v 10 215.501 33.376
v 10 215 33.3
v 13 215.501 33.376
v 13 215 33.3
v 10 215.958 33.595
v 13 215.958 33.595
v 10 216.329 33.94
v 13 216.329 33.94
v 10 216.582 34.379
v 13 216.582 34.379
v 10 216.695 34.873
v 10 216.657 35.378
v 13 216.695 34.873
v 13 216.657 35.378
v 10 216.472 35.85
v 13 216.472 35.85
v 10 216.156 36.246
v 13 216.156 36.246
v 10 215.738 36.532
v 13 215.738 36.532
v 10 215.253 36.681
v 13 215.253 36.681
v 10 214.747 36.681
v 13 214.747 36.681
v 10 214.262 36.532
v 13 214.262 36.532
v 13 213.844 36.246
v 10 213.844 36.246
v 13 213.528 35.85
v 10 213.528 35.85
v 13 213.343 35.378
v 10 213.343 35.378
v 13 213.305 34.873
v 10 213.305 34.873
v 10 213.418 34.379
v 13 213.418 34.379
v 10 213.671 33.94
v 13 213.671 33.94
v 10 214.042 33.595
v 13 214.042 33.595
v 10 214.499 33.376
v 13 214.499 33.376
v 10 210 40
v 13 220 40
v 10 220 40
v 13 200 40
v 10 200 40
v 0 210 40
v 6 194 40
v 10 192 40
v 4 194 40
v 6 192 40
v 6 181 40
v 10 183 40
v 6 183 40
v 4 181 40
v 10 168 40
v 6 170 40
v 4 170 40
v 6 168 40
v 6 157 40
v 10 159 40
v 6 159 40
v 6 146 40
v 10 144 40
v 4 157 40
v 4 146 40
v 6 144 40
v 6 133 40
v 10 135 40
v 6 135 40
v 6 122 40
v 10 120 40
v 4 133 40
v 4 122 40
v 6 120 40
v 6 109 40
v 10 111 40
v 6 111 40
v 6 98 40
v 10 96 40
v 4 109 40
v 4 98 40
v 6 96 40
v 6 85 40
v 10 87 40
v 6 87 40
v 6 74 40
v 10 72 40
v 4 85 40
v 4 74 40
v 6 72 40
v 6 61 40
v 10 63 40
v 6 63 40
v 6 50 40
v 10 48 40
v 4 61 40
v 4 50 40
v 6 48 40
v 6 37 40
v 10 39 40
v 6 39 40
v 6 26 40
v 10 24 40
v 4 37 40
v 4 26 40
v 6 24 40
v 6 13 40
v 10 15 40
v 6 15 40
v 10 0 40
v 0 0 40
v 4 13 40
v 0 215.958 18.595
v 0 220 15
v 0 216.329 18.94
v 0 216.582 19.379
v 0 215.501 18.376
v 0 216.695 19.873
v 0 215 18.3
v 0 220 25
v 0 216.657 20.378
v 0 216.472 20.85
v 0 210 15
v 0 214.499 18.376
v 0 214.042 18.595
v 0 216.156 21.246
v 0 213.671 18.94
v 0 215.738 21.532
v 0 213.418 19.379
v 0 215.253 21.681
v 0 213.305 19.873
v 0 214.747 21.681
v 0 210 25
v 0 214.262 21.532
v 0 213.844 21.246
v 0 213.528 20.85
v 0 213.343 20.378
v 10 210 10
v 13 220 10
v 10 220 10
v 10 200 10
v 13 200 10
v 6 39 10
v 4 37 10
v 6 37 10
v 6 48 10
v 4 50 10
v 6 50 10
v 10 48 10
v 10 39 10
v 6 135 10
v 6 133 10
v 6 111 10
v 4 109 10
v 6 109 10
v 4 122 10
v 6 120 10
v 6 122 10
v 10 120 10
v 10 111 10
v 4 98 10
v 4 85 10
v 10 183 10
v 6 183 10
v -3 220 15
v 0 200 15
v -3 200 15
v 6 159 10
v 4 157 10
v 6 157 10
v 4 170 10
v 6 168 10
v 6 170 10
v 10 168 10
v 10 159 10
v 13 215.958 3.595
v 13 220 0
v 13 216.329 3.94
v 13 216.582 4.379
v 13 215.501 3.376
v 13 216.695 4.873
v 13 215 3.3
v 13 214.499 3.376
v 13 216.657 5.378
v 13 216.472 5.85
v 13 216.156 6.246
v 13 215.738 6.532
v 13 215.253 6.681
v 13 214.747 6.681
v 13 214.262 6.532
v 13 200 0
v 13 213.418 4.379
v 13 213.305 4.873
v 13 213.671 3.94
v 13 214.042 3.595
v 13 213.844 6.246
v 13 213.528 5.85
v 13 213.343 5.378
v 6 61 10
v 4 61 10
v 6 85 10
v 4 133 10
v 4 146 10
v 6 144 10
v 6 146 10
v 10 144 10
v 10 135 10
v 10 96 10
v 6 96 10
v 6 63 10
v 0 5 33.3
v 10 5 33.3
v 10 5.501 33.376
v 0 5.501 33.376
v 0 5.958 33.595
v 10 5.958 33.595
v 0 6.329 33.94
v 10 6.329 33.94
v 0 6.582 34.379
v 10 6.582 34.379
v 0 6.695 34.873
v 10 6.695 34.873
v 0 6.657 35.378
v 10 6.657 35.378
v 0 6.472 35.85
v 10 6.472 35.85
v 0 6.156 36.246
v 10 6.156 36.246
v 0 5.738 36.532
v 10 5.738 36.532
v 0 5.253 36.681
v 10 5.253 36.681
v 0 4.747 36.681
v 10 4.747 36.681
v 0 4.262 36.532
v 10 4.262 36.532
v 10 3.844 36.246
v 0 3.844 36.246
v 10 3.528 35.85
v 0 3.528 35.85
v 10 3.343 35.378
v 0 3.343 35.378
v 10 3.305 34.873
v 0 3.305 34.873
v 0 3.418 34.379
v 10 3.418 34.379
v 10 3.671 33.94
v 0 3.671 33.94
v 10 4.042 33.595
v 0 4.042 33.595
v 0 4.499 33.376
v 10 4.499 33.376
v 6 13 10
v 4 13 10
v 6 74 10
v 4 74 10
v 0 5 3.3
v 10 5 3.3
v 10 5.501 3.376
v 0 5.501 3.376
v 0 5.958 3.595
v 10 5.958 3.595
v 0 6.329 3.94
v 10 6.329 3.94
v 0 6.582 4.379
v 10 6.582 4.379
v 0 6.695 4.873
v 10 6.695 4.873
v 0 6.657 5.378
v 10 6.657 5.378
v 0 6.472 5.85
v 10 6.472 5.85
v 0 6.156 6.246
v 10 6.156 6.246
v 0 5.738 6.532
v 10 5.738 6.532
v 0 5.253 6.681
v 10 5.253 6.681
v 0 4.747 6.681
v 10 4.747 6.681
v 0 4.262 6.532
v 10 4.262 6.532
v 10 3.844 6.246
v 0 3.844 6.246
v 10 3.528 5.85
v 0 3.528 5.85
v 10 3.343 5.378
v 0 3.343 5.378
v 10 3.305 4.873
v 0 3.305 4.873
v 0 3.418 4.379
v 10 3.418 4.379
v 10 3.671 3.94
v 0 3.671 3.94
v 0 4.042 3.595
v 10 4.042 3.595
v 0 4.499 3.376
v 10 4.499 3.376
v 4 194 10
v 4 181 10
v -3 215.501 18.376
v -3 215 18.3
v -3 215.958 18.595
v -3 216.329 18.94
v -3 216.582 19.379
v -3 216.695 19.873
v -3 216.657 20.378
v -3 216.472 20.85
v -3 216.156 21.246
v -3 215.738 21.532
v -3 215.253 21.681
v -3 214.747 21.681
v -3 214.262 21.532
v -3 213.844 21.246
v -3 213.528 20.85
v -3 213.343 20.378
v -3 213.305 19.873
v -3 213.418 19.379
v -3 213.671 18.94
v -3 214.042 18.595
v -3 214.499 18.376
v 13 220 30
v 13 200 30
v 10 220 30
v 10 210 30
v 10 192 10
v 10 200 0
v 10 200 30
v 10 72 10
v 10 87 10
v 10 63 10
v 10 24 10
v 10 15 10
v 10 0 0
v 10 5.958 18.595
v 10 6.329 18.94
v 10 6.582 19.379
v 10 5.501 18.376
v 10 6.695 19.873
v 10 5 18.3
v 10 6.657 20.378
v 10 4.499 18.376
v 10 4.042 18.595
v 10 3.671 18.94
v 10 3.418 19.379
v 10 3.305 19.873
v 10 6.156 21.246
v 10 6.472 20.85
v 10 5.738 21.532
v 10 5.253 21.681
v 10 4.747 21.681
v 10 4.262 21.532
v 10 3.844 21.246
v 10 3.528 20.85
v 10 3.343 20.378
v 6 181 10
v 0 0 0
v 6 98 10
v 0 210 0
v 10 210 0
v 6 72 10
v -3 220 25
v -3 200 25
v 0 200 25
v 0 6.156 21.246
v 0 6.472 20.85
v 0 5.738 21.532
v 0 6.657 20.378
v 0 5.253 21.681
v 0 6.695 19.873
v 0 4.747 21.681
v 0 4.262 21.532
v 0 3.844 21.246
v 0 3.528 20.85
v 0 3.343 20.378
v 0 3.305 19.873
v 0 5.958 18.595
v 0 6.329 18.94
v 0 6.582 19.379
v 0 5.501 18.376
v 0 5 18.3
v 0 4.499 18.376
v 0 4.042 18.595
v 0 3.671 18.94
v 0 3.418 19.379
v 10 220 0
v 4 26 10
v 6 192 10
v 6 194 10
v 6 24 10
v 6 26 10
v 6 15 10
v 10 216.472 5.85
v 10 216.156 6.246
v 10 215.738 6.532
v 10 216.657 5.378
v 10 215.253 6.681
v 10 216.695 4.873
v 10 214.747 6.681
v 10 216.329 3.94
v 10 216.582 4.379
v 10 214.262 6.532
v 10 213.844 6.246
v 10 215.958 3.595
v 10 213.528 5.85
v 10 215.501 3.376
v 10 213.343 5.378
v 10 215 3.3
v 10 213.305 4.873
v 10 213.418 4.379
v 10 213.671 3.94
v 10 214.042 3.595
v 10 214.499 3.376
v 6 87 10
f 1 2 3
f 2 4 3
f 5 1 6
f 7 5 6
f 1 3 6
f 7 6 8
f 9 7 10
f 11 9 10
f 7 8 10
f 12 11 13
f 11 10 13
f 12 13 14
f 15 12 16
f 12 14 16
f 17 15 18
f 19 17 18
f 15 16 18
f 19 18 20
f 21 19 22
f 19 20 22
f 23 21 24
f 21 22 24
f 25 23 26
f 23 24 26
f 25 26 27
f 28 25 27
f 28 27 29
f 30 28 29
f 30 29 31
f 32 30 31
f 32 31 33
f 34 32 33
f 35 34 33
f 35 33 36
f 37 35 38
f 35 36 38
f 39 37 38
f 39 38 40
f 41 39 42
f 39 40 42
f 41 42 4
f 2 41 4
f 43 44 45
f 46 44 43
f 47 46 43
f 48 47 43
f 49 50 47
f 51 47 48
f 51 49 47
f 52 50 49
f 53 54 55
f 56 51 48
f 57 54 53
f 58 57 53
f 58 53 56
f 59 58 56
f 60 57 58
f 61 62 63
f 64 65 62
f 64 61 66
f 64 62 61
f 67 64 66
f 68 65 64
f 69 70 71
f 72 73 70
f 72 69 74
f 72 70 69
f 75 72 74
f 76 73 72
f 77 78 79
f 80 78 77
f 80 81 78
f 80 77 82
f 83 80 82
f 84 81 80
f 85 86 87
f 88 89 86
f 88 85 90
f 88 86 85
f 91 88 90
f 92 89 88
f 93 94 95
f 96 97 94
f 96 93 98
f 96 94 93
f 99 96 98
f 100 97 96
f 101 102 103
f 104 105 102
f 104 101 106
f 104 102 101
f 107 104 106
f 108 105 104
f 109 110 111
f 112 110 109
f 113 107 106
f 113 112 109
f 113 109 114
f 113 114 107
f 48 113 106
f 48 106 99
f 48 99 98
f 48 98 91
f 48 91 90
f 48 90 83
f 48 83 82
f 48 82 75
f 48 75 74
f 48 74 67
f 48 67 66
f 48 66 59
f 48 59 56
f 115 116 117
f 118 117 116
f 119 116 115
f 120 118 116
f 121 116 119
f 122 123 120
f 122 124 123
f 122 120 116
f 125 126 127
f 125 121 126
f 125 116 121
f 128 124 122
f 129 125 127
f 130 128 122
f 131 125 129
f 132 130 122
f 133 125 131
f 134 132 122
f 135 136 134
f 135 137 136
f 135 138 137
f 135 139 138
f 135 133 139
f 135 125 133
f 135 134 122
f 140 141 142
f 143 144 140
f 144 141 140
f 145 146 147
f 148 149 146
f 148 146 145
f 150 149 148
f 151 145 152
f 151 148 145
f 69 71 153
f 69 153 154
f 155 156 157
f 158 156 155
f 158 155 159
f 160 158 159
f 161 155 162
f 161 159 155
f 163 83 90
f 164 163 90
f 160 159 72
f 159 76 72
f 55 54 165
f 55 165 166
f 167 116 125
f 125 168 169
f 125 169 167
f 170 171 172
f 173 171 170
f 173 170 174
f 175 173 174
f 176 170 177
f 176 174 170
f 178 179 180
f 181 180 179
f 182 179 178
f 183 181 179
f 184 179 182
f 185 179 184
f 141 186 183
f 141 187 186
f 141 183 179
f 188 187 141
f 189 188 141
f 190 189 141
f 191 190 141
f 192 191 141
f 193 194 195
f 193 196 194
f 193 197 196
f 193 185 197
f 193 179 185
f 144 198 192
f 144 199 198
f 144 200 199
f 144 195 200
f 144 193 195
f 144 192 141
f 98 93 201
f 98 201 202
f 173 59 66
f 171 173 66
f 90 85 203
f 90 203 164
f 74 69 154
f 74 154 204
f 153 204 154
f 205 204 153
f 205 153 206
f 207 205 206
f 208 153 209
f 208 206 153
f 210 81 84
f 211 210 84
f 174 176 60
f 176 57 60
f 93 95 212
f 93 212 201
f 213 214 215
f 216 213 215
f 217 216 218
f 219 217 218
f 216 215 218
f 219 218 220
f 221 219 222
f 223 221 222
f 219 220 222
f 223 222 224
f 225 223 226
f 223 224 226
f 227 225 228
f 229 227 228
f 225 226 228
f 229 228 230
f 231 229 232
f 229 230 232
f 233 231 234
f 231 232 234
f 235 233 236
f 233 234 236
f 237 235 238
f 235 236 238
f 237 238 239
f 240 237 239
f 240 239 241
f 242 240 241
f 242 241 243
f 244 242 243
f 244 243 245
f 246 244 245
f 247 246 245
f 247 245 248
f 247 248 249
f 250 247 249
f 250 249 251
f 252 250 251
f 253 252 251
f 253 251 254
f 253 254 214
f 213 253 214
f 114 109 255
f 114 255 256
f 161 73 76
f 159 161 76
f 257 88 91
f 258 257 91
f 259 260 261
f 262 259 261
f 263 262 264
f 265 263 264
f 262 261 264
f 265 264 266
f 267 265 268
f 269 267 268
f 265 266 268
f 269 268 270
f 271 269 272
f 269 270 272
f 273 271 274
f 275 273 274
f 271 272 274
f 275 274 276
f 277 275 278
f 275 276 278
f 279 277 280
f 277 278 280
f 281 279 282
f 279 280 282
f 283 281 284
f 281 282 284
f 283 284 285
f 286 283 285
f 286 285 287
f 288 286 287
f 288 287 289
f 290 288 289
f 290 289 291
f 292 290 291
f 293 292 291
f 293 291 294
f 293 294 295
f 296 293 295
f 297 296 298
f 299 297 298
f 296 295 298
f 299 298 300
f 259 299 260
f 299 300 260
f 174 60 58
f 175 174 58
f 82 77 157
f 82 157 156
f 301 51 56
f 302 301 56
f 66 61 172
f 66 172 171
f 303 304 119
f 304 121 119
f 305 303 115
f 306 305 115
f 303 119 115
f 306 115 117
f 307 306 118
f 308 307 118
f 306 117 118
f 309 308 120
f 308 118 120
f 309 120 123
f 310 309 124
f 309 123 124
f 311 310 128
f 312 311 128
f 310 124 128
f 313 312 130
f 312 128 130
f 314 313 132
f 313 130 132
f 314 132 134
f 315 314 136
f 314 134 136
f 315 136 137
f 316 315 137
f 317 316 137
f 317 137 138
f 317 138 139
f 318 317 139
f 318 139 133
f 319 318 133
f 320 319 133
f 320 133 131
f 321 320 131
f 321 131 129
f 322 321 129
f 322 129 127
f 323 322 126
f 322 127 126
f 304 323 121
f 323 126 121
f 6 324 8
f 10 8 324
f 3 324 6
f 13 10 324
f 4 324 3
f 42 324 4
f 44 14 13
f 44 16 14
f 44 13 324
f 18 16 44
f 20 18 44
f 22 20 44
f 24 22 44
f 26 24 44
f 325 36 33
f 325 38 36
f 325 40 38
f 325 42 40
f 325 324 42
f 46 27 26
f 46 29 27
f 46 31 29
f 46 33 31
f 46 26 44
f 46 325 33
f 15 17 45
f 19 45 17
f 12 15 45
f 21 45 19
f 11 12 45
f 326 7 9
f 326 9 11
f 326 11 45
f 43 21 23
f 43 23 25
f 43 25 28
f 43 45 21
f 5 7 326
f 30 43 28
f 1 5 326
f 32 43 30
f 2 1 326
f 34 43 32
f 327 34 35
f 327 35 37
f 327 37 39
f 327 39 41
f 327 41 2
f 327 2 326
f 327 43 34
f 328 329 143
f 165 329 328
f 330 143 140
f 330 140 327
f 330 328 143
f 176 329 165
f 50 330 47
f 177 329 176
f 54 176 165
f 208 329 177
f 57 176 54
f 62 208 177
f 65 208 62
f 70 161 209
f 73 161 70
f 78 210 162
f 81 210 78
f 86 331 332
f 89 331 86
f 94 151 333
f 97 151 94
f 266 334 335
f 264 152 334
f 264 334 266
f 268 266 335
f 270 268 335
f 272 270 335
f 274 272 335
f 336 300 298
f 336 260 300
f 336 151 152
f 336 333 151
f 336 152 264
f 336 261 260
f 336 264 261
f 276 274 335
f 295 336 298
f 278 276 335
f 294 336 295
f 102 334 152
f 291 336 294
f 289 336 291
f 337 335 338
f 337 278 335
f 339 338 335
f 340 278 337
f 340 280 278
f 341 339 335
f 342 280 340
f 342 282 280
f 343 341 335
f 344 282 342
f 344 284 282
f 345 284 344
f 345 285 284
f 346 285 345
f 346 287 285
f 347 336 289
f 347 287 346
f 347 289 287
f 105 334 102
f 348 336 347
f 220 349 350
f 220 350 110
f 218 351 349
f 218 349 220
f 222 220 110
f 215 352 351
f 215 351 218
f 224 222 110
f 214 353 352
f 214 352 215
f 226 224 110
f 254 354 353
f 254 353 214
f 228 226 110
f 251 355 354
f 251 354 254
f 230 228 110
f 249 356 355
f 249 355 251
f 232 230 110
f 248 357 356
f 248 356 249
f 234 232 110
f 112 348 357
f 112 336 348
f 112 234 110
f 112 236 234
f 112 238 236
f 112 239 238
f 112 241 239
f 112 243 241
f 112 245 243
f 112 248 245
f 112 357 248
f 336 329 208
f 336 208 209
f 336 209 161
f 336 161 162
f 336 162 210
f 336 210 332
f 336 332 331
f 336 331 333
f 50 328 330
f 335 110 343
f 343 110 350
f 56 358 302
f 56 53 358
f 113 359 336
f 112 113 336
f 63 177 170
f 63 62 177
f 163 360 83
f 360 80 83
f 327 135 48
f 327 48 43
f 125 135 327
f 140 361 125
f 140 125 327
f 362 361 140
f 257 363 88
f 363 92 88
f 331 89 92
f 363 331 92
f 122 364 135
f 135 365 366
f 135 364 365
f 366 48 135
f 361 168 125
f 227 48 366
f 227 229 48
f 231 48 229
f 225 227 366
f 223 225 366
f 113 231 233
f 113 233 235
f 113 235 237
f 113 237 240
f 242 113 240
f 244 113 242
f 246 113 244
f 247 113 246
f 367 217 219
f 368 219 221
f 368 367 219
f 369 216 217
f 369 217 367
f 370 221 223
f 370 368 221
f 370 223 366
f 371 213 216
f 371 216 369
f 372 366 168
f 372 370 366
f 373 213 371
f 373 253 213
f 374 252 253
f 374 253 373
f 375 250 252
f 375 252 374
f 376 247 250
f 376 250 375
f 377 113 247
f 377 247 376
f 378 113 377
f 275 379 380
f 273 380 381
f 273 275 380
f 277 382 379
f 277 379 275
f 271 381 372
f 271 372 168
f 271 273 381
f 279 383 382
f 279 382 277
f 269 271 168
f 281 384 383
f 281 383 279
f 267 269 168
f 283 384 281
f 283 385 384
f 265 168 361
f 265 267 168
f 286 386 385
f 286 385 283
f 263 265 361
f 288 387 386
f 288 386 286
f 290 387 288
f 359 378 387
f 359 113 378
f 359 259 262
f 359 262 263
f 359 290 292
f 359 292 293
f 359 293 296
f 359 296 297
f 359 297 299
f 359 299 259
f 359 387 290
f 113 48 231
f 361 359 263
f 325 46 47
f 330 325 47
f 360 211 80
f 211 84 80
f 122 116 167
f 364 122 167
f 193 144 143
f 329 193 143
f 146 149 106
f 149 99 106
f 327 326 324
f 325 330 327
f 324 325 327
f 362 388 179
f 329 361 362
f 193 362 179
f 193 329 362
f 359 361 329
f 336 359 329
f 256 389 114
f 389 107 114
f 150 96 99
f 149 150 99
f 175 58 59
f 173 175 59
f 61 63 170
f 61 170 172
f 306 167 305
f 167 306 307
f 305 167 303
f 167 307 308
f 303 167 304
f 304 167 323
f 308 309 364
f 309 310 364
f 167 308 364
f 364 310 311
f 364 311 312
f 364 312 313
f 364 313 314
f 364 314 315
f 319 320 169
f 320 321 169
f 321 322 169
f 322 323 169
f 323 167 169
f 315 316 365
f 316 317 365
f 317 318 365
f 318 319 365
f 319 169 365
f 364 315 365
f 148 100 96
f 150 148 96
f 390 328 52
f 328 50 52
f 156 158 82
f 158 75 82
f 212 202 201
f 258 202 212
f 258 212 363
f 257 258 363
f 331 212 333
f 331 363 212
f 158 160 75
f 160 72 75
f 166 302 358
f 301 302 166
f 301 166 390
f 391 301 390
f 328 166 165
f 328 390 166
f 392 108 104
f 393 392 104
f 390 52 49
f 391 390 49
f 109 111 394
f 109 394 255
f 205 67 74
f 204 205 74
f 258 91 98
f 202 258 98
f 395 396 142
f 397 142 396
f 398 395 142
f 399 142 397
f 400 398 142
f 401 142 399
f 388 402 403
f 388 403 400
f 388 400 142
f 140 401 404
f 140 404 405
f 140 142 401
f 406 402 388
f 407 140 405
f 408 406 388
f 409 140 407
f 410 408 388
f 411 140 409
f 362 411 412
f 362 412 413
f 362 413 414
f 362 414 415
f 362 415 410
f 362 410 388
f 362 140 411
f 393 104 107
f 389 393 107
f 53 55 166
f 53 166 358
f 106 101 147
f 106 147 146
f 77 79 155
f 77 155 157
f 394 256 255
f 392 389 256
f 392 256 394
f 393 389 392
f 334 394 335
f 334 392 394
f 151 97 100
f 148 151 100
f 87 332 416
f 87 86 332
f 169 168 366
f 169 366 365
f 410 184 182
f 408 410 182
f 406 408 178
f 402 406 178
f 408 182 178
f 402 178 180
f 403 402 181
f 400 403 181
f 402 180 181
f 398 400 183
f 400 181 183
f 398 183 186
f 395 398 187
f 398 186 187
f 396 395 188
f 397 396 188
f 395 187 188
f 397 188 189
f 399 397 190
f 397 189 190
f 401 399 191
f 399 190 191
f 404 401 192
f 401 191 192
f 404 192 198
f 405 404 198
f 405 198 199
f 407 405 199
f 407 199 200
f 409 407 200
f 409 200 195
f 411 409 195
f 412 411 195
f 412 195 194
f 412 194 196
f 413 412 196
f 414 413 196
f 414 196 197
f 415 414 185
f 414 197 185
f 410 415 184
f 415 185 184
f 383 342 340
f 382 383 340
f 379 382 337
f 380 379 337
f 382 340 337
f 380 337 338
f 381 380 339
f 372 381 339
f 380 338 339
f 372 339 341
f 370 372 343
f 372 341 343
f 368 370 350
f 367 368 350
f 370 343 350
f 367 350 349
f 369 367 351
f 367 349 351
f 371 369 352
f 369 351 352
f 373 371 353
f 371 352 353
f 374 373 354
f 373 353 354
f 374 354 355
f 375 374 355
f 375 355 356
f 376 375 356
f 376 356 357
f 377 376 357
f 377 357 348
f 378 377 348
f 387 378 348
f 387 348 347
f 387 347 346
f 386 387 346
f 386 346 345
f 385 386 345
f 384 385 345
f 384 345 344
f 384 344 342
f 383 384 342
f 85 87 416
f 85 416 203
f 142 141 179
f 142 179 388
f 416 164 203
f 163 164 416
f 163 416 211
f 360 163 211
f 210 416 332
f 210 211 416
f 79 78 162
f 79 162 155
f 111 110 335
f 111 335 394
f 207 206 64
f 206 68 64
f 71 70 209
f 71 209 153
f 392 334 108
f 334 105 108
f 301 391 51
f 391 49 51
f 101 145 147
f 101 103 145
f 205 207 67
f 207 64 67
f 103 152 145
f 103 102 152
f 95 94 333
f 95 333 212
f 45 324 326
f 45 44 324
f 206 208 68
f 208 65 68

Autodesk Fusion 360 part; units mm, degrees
sketch "Sketch1" plane through (0, 0, 0) normal (0, 1, 0) x (1, 0, 0)
  line L0 (0, 0) -> (10, 0)
  line L1 (10, 0) -> (10, -40)
  line L2 (10, -40) -> (0, -40)
  line L3 (0, -40) -> (0, 0)
  dimension "d1" = 10
  dimension "d2" = 40
extrude "Extrude1" add sketch "Sketch1" along normal blind 210
sketch "Sketch2" plane through (0, 210, 0) normal (0, 1, 0) x (-1, 0, 0)
  line L0 (0, 40) -> (-10, 40)
  line L1 (-10, 40) -> (-10, 0)
  line L2 (-10, 0) -> (0, 0)
  line L3 (0, 0) -> (0, 40)
  line L4 (0, 15) -> (3, 15)
  line L5 (3, 15) -> (3, 25)
  line L6 (3, 25) -> (0, 25)
  line L7 (0, 25) -> (0, 15)
  line L8 (-10, 0) -> (-13, 0)
  line L9 (-13, 0) -> (-13, 10)
  line L10 (-13, 10) -> (-10, 10)
  line L11 (-10, 10) -> (-10, 0)
  line L12 (-10, 30) -> (-13, 30)
  line L13 (-13, 30) -> (-13, 40)
  line L14 (-13, 40) -> (-10, 40)
  line L15 (-10, 40) -> (-10, 30)
  dimension "d5" = 3
  dimension "d10" = 3
  dimension "d11" = 3
extrude "Extrude2" add sketch "Sketch2" along normal blind 10 and the other way blind 10 contours L1 L12 L13 L14 L15 | L3 L4 L5 L6 L7 | L1 L8 L9 L10 L11
sketch "Sketch3" plane through (10, 0, 0) normal (1, 0, 0) x (0, 0, -1)
  line L0 (-10, 200) -> (-10, 210)
  line L1 (-10, 210) -> (-30, 210)
  line L2 (-30, 210) -> (-30, 200)
  line L3 (-30, 200) -> (-40, 200)
  line L4 (-40, 200) -> (-40, 0)
  line L5 (-40, 0) -> (0, 0)
  line L6 (0, 0) -> (0, 200)
  line L7 (0, 200) -> (-10, 200)
sketch "Sketch4" plane through (0, 0, 40) normal (0, 0, 1) x (1, 0, 0)
  line L0 (0, 0) -> (10, 0)
  line L1 (10, 0) -> (10, 200)
  line L2 (10, 200) -> (13, 200)
  line L3 (13, 200) -> (13, 220)
  line L4 (13, 220) -> (10, 220)
  line L5 (10, 220) -> (10, 210)
  line L6 (10, 210) -> (0, 210)
  line L7 (0, 210) -> (0, 0)
  line L8 (10, 15) -> (4, 15)
  line L9 (4, 15) -> (4, 20)
  line L10 (4, 20) -> (10, 20)
  line L11 (10, 20) -> (10, 15)
  line L12 (4, 20) -> (7, 20)
  line L13 (7, 20) -> (7, 22)
  line L14 (7, 22) -> (4, 22)
  line L15 (4, 22) -> (4, 20)
  line L16 (4, 22) -> (10, 22)
  line L17 (10, 22) -> (10, 24)
  line L18 (10, 24) -> (4, 24)
  line L19 (4, 24) -> (4, 22)
  line L20 (4, 44) -> (10, 44)
  line L21 (4, 46) -> (10, 46)
  line L22 (7, 44) -> (7, 46)
  line L23 (4, 46) -> (4, 44)
  line L24 (10, 48) -> (4, 48)
  line L25 (4, 39) -> (4, 44)
  line L26 (10, 39) -> (4, 39)
  line L27 (10, 44) -> (10, 39)
  line L28 (10, 46) -> (10, 48)
  line L29 (4, 48) -> (4, 46)
  line L30 (4, 68) -> (10, 68)
  line L31 (4, 70) -> (10, 70)
  line L32 (7, 68) -> (7, 70)
  line L33 (4, 70) -> (4, 68)
  line L34 (10, 72) -> (4, 72)
  line L35 (4, 63) -> (4, 68)
  line L36 (10, 63) -> (4, 63)
  line L37 (10, 68) -> (10, 63)
  line L38 (10, 70) -> (10, 72)
  line L39 (4, 72) -> (4, 70)
  line L40 (4, 92) -> (10, 92)
  line L41 (4, 94) -> (10, 94)
  line L42 (7, 92) -> (7, 94)
  line L43 (4, 94) -> (4, 92)
  line L44 (10, 96) -> (4, 96)
  line L45 (4, 87) -> (4, 92)
  line L46 (10, 87) -> (4, 87)
  line L47 (10, 92) -> (10, 87)
  line L48 (10, 94) -> (10, 96)
  line L49 (4, 96) -> (4, 94)
  line L50 (4, 116) -> (10, 116)
  line L51 (4, 118) -> (10, 118)
  line L52 (7, 116) -> (7, 118)
  line L53 (4, 118) -> (4, 116)
  line L54 (10, 120) -> (4, 120)
  line L55 (4, 111) -> (4, 116)
  line L56 (10, 111) -> (4, 111)
  line L57 (10, 116) -> (10, 111)
  line L58 (10, 118) -> (10, 120)
  line L59 (4, 120) -> (4, 118)
  line L60 (4, 140) -> (10, 140)
  line L61 (4, 142) -> (10, 142)
  line L62 (7, 140) -> (7, 142)
  line L63 (4, 142) -> (4, 140)
  line L64 (10, 144) -> (4, 144)
  line L65 (4, 135) -> (4, 140)
  line L66 (10, 135) -> (4, 135)
  line L67 (10, 140) -> (10, 135)
  line L68 (10, 142) -> (10, 144)
  line L69 (4, 144) -> (4, 142)
  line L70 (4, 164) -> (10, 164)
  line L71 (4, 166) -> (10, 166)
  line L72 (7, 164) -> (7, 166)
  line L73 (4, 166) -> (4, 164)
  line L74 (10, 168) -> (4, 168)
  line L75 (4, 159) -> (4, 164)
  line L76 (10, 159) -> (4, 159)
  line L77 (10, 164) -> (10, 159)
  line L78 (10, 166) -> (10, 168)
  line L79 (4, 168) -> (4, 166)
  line L80 (4, 188) -> (10, 188)
  line L81 (4, 190) -> (10, 190)
  line L82 (7, 188) -> (7, 190)
  line L83 (4, 190) -> (4, 188)
  line L84 (10, 192) -> (4, 192)
  line L85 (4, 183) -> (4, 188)
  line L86 (10, 183) -> (4, 183)
  line L87 (10, 188) -> (10, 183)
  line L88 (10, 190) -> (10, 192)
  line L89 (4, 192) -> (4, 190)
  dimension "d12" = 5
  dimension "d13" = 2
  dimension "d14" = 2
  dimension "d15" = 6
  dimension "d16" = 3
  dimension "d17" = 15
  dimension "d20" = 168
  dimension "d21" = 0
extrude "Extrude3" cut sketch "Sketch4" against normal blind 30 contours L1 L8 L9 L10 L11 L12 | L1 L10 L13 L16 | L1 L14 L16 L17 L18 L19 | L10 L12 L13 L14 L15 L16 | L1 L20 L25 L26 L27 | L1 L20 L21 L22 | L1 L81 L84 L88 L89 | L1 L21 L24 L28 L29 | L20 L21 L22 L23 | L1 L80 L81 L82 | L1 L80 L85 L86 L87 | L80 L81 L82 L83 | L1 L30 L35 L36 L37 | L1 L30 L31 L32 | L1 L71 L74 L78 L79 | L1 L31 L34 L38 L39 | L30 L31 L32 L33 | L1 L70 L71 L72 | L1 L70 L75 L76 L77 | L70 L71 L72 L73 | L1 L40 L45 L46 L47 | L1 L40 L41 L42 | L1 L61 L64 L68 L69 | L1 L41 L44 L48 L49 | L40 L41 L42 L43 | L1 L60 L61 L62 | L1 L60 L65 L66 L67 | L60 L61 L62 L63 | L1 L50 L55 L56 L57 | L1 L50 L51 L52 | L1 L51 L54 L58 L59 | L50 L51 L52 L53
sketch "Sketch6" plane through (0, 0, 40) normal (0, 0, 1) x (1, 0, 0)
  line L0 (4, 120) -> (10, 120)
  line L1 (10, 120) -> (10, 135)
  line L2 (10, 135) -> (4, 135)
  line L3 (4, 135) -> (4, 144)
  line L4 (4, 144) -> (10, 144)
  line L5 (10, 144) -> (10, 159)
  line L6 (10, 159) -> (4, 159)
  line L7 (4, 159) -> (4, 168)
  line L8 (4, 168) -> (10, 168)
  line L9 (10, 168) -> (10, 183)
  line L10 (10, 183) -> (4, 183)
  line L11 (4, 183) -> (4, 192)
  line L12 (4, 192) -> (10, 192)
  line L13 (10, 192) -> (10, 200)
  line L14 (10, 200) -> (13, 200)
  line L15 (13, 200) -> (13, 220)
  line L16 (13, 220) -> (10, 220)
  line L17 (10, 220) -> (10, 210)
  line L18 (10, 210) -> (0, 210)
  line L19 (0, 210) -> (0, 0)
  line L20 (0, 0) -> (10, 0)
  line L21 (10, 0) -> (10, 15)
  line L22 (10, 15) -> (4, 15)
  line L23 (4, 15) -> (4, 24)
  line L24 (4, 24) -> (10, 24)
  line L25 (10, 24) -> (10, 39)
  line L26 (10, 39) -> (4, 39)
  line L27 (4, 39) -> (4, 48)
  line L28 (4, 48) -> (10, 48)
  line L29 (10, 48) -> (10, 63)
  line L30 (10, 63) -> (4, 63)
  line L31 (4, 63) -> (4, 72)
  line L32 (4, 72) -> (10, 72)
  line L33 (10, 72) -> (10, 87)
  line L34 (10, 87) -> (4, 87)
  line L35 (4, 87) -> (4, 96)
  line L36 (4, 96) -> (10, 96)
  line L37 (10, 96) -> (10, 111)
  line L38 (10, 111) -> (4, 111)
  line L39 (4, 111) -> (4, 120)
  line L40 (4, 192) -> (6, 192)
  line L41 (6, 192) -> (6, 194)
  line L42 (6, 194) -> (4, 194)
  line L43 (4, 194) -> (4, 192)
  line L44 (4, 183) -> (6, 183)
  line L45 (6, 183) -> (6, 181)
  line L46 (6, 181) -> (4, 181)
  line L47 (4, 181) -> (4, 183)
  line L48 (6, 157) -> (4, 157)
  line L49 (6, 159) -> (6, 157)
  line L50 (4, 159) -> (6, 159)
  line L51 (4, 157) -> (4, 159)
  line L52 (4, 168) -> (6, 168)
  line L53 (6, 168) -> (6, 170)
  line L54 (6, 170) -> (4, 170)
  line L55 (4, 170) -> (4, 168)
  line L56 (6, 133) -> (4, 133)
  line L57 (6, 135) -> (6, 133)
  line L58 (4, 135) -> (6, 135)
  line L59 (4, 133) -> (4, 135)
  line L60 (4, 144) -> (6, 144)
  line L61 (6, 144) -> (6, 146)
  line L62 (6, 146) -> (4, 146)
  line L63 (4, 146) -> (4, 144)
  line L64 (6, 109) -> (4, 109)
  line L65 (6, 111) -> (6, 109)
  line L66 (4, 111) -> (6, 111)
  line L67 (4, 109) -> (4, 111)
  line L68 (4, 120) -> (6, 120)
  line L69 (6, 120) -> (6, 122)
  line L70 (6, 122) -> (4, 122)
  line L71 (4, 122) -> (4, 120)
  line L72 (6, 85) -> (4, 85)
  line L73 (6, 87) -> (6, 85)
  line L74 (4, 87) -> (6, 87)
  line L75 (4, 85) -> (4, 87)
  line L76 (4, 96) -> (6, 96)
  line L77 (6, 96) -> (6, 98)
  line L78 (6, 98) -> (4, 98)
  line L79 (4, 98) -> (4, 96)
  line L80 (6, 61) -> (4, 61)
  line L81 (6, 63) -> (6, 61)
  line L82 (4, 63) -> (6, 63)
  line L83 (4, 61) -> (4, 63)
  line L84 (4, 72) -> (6, 72)
  line L85 (6, 72) -> (6, 74)
  line L86 (6, 74) -> (4, 74)
  line L87 (4, 74) -> (4, 72)
  line L88 (6, 37) -> (4, 37)
  line L89 (6, 39) -> (6, 37)
  line L90 (4, 39) -> (6, 39)
  line L91 (4, 37) -> (4, 39)
  line L92 (4, 48) -> (6, 48)
  line L93 (6, 48) -> (6, 50)
  line L94 (6, 50) -> (4, 50)
  line L95 (4, 50) -> (4, 48)
  line L96 (6, 13) -> (4, 13)
  line L97 (6, 15) -> (6, 13)
  line L98 (4, 15) -> (6, 15)
  line L99 (4, 13) -> (4, 15)
  line L100 (4, 24) -> (6, 24)
  line L101 (6, 24) -> (6, 26)
  line L102 (6, 26) -> (4, 26)
  line L103 (4, 26) -> (4, 24)
  dimension "d31" = 2
  dimension "d32" = 2
  dimension "d33" = 2
  dimension "d34" = 2
  dimension "d37" = -168
  dimension "d38" = 0
extrude "Extrude5" cut sketch "Sketch6" against normal blind 30 contours L0 L68 L69 L70 L71 | L38 L64 L65 L66 L67 | L2 L56 L57 L58 L59 | L36 L76 L77 L78 L79 | L4 L60 L61 L62 L63 | L34 L72 L73 L74 L75 | L6 L48 L49 L50 L51 | L32 L84 L85 L86 L87 | L8 L52 L53 L54 L55 | L30 L80 L81 L82 L83 | L10 L44 L45 L46 L47 | L28 L92 L93 L94 L95 | L12 L40 L41 L42 L43 | L26 L88 L89 L90 L91 | L24 L100 L101 L102 L103 | L22 L96 L97 L98 L99
sketch "Sketch7" plane through (13, 0, 0) normal (1, 0, 0) x (0, 0, -1)
  line L0 (-30, 200) -> (-30, 220)
  line L1 (-30, 220) -> (-40, 220)
  line L2 (-40, 220) -> (-40, 200)
  line L3 (-40, 200) -> (-30, 200)
  circle A0 centre (-35, 215) radius 1.7
  circle A1 centre (-5, 215) radius 1.7
  circle A2 centre (-20, 215) radius 1.7
  line L4 (-35, 220) -> (-35, 200) construction
  line L5 (-5, 220) -> (-5, 200) construction
  line L6 (-20, 220) -> (-20, 210) construction
  line L7 (-25, 220) -> (-15, 220)
  line L8 (-10, 220) -> (0, 220)
  dimension "d41" = 3.4
  dimension "d42" = 3.4
  dimension "d43" = 3.4
  dimension "d44" = 5
  dimension "d45" = 5
  dimension "d46" = 5
extrude "Extrude6" cut sketch "Sketch7" against normal blind 40 contours A0 | A1 | A2
sketch "Sketch8" plane through (10, 0, 0) normal (1, 0, 0) x (0, 0, -1)
  circle A0 centre (-35, 5) radius 1.7
  circle A1 centre (-20, 5) radius 1.7
  circle A2 centre (-5, 5) radius 1.7
  line L0 (-40, 0) -> (0, 0)
  line L1 (-40, 200) -> (-40, 0)
  line L2 (0, 0) -> (0, 200)
  dimension "d49" = 3.4
  dimension "d50" = 3.4
  dimension "d51" = 3.4
  dimension "d52" = 5
  dimension "d53" = 5
  dimension "d54" = 5
  dimension "d55" = 5
  dimension "d56" = 5
  dimension "d57" = 20
extrude "Extrude7" cut sketch "Sketch8" against normal blind 37
